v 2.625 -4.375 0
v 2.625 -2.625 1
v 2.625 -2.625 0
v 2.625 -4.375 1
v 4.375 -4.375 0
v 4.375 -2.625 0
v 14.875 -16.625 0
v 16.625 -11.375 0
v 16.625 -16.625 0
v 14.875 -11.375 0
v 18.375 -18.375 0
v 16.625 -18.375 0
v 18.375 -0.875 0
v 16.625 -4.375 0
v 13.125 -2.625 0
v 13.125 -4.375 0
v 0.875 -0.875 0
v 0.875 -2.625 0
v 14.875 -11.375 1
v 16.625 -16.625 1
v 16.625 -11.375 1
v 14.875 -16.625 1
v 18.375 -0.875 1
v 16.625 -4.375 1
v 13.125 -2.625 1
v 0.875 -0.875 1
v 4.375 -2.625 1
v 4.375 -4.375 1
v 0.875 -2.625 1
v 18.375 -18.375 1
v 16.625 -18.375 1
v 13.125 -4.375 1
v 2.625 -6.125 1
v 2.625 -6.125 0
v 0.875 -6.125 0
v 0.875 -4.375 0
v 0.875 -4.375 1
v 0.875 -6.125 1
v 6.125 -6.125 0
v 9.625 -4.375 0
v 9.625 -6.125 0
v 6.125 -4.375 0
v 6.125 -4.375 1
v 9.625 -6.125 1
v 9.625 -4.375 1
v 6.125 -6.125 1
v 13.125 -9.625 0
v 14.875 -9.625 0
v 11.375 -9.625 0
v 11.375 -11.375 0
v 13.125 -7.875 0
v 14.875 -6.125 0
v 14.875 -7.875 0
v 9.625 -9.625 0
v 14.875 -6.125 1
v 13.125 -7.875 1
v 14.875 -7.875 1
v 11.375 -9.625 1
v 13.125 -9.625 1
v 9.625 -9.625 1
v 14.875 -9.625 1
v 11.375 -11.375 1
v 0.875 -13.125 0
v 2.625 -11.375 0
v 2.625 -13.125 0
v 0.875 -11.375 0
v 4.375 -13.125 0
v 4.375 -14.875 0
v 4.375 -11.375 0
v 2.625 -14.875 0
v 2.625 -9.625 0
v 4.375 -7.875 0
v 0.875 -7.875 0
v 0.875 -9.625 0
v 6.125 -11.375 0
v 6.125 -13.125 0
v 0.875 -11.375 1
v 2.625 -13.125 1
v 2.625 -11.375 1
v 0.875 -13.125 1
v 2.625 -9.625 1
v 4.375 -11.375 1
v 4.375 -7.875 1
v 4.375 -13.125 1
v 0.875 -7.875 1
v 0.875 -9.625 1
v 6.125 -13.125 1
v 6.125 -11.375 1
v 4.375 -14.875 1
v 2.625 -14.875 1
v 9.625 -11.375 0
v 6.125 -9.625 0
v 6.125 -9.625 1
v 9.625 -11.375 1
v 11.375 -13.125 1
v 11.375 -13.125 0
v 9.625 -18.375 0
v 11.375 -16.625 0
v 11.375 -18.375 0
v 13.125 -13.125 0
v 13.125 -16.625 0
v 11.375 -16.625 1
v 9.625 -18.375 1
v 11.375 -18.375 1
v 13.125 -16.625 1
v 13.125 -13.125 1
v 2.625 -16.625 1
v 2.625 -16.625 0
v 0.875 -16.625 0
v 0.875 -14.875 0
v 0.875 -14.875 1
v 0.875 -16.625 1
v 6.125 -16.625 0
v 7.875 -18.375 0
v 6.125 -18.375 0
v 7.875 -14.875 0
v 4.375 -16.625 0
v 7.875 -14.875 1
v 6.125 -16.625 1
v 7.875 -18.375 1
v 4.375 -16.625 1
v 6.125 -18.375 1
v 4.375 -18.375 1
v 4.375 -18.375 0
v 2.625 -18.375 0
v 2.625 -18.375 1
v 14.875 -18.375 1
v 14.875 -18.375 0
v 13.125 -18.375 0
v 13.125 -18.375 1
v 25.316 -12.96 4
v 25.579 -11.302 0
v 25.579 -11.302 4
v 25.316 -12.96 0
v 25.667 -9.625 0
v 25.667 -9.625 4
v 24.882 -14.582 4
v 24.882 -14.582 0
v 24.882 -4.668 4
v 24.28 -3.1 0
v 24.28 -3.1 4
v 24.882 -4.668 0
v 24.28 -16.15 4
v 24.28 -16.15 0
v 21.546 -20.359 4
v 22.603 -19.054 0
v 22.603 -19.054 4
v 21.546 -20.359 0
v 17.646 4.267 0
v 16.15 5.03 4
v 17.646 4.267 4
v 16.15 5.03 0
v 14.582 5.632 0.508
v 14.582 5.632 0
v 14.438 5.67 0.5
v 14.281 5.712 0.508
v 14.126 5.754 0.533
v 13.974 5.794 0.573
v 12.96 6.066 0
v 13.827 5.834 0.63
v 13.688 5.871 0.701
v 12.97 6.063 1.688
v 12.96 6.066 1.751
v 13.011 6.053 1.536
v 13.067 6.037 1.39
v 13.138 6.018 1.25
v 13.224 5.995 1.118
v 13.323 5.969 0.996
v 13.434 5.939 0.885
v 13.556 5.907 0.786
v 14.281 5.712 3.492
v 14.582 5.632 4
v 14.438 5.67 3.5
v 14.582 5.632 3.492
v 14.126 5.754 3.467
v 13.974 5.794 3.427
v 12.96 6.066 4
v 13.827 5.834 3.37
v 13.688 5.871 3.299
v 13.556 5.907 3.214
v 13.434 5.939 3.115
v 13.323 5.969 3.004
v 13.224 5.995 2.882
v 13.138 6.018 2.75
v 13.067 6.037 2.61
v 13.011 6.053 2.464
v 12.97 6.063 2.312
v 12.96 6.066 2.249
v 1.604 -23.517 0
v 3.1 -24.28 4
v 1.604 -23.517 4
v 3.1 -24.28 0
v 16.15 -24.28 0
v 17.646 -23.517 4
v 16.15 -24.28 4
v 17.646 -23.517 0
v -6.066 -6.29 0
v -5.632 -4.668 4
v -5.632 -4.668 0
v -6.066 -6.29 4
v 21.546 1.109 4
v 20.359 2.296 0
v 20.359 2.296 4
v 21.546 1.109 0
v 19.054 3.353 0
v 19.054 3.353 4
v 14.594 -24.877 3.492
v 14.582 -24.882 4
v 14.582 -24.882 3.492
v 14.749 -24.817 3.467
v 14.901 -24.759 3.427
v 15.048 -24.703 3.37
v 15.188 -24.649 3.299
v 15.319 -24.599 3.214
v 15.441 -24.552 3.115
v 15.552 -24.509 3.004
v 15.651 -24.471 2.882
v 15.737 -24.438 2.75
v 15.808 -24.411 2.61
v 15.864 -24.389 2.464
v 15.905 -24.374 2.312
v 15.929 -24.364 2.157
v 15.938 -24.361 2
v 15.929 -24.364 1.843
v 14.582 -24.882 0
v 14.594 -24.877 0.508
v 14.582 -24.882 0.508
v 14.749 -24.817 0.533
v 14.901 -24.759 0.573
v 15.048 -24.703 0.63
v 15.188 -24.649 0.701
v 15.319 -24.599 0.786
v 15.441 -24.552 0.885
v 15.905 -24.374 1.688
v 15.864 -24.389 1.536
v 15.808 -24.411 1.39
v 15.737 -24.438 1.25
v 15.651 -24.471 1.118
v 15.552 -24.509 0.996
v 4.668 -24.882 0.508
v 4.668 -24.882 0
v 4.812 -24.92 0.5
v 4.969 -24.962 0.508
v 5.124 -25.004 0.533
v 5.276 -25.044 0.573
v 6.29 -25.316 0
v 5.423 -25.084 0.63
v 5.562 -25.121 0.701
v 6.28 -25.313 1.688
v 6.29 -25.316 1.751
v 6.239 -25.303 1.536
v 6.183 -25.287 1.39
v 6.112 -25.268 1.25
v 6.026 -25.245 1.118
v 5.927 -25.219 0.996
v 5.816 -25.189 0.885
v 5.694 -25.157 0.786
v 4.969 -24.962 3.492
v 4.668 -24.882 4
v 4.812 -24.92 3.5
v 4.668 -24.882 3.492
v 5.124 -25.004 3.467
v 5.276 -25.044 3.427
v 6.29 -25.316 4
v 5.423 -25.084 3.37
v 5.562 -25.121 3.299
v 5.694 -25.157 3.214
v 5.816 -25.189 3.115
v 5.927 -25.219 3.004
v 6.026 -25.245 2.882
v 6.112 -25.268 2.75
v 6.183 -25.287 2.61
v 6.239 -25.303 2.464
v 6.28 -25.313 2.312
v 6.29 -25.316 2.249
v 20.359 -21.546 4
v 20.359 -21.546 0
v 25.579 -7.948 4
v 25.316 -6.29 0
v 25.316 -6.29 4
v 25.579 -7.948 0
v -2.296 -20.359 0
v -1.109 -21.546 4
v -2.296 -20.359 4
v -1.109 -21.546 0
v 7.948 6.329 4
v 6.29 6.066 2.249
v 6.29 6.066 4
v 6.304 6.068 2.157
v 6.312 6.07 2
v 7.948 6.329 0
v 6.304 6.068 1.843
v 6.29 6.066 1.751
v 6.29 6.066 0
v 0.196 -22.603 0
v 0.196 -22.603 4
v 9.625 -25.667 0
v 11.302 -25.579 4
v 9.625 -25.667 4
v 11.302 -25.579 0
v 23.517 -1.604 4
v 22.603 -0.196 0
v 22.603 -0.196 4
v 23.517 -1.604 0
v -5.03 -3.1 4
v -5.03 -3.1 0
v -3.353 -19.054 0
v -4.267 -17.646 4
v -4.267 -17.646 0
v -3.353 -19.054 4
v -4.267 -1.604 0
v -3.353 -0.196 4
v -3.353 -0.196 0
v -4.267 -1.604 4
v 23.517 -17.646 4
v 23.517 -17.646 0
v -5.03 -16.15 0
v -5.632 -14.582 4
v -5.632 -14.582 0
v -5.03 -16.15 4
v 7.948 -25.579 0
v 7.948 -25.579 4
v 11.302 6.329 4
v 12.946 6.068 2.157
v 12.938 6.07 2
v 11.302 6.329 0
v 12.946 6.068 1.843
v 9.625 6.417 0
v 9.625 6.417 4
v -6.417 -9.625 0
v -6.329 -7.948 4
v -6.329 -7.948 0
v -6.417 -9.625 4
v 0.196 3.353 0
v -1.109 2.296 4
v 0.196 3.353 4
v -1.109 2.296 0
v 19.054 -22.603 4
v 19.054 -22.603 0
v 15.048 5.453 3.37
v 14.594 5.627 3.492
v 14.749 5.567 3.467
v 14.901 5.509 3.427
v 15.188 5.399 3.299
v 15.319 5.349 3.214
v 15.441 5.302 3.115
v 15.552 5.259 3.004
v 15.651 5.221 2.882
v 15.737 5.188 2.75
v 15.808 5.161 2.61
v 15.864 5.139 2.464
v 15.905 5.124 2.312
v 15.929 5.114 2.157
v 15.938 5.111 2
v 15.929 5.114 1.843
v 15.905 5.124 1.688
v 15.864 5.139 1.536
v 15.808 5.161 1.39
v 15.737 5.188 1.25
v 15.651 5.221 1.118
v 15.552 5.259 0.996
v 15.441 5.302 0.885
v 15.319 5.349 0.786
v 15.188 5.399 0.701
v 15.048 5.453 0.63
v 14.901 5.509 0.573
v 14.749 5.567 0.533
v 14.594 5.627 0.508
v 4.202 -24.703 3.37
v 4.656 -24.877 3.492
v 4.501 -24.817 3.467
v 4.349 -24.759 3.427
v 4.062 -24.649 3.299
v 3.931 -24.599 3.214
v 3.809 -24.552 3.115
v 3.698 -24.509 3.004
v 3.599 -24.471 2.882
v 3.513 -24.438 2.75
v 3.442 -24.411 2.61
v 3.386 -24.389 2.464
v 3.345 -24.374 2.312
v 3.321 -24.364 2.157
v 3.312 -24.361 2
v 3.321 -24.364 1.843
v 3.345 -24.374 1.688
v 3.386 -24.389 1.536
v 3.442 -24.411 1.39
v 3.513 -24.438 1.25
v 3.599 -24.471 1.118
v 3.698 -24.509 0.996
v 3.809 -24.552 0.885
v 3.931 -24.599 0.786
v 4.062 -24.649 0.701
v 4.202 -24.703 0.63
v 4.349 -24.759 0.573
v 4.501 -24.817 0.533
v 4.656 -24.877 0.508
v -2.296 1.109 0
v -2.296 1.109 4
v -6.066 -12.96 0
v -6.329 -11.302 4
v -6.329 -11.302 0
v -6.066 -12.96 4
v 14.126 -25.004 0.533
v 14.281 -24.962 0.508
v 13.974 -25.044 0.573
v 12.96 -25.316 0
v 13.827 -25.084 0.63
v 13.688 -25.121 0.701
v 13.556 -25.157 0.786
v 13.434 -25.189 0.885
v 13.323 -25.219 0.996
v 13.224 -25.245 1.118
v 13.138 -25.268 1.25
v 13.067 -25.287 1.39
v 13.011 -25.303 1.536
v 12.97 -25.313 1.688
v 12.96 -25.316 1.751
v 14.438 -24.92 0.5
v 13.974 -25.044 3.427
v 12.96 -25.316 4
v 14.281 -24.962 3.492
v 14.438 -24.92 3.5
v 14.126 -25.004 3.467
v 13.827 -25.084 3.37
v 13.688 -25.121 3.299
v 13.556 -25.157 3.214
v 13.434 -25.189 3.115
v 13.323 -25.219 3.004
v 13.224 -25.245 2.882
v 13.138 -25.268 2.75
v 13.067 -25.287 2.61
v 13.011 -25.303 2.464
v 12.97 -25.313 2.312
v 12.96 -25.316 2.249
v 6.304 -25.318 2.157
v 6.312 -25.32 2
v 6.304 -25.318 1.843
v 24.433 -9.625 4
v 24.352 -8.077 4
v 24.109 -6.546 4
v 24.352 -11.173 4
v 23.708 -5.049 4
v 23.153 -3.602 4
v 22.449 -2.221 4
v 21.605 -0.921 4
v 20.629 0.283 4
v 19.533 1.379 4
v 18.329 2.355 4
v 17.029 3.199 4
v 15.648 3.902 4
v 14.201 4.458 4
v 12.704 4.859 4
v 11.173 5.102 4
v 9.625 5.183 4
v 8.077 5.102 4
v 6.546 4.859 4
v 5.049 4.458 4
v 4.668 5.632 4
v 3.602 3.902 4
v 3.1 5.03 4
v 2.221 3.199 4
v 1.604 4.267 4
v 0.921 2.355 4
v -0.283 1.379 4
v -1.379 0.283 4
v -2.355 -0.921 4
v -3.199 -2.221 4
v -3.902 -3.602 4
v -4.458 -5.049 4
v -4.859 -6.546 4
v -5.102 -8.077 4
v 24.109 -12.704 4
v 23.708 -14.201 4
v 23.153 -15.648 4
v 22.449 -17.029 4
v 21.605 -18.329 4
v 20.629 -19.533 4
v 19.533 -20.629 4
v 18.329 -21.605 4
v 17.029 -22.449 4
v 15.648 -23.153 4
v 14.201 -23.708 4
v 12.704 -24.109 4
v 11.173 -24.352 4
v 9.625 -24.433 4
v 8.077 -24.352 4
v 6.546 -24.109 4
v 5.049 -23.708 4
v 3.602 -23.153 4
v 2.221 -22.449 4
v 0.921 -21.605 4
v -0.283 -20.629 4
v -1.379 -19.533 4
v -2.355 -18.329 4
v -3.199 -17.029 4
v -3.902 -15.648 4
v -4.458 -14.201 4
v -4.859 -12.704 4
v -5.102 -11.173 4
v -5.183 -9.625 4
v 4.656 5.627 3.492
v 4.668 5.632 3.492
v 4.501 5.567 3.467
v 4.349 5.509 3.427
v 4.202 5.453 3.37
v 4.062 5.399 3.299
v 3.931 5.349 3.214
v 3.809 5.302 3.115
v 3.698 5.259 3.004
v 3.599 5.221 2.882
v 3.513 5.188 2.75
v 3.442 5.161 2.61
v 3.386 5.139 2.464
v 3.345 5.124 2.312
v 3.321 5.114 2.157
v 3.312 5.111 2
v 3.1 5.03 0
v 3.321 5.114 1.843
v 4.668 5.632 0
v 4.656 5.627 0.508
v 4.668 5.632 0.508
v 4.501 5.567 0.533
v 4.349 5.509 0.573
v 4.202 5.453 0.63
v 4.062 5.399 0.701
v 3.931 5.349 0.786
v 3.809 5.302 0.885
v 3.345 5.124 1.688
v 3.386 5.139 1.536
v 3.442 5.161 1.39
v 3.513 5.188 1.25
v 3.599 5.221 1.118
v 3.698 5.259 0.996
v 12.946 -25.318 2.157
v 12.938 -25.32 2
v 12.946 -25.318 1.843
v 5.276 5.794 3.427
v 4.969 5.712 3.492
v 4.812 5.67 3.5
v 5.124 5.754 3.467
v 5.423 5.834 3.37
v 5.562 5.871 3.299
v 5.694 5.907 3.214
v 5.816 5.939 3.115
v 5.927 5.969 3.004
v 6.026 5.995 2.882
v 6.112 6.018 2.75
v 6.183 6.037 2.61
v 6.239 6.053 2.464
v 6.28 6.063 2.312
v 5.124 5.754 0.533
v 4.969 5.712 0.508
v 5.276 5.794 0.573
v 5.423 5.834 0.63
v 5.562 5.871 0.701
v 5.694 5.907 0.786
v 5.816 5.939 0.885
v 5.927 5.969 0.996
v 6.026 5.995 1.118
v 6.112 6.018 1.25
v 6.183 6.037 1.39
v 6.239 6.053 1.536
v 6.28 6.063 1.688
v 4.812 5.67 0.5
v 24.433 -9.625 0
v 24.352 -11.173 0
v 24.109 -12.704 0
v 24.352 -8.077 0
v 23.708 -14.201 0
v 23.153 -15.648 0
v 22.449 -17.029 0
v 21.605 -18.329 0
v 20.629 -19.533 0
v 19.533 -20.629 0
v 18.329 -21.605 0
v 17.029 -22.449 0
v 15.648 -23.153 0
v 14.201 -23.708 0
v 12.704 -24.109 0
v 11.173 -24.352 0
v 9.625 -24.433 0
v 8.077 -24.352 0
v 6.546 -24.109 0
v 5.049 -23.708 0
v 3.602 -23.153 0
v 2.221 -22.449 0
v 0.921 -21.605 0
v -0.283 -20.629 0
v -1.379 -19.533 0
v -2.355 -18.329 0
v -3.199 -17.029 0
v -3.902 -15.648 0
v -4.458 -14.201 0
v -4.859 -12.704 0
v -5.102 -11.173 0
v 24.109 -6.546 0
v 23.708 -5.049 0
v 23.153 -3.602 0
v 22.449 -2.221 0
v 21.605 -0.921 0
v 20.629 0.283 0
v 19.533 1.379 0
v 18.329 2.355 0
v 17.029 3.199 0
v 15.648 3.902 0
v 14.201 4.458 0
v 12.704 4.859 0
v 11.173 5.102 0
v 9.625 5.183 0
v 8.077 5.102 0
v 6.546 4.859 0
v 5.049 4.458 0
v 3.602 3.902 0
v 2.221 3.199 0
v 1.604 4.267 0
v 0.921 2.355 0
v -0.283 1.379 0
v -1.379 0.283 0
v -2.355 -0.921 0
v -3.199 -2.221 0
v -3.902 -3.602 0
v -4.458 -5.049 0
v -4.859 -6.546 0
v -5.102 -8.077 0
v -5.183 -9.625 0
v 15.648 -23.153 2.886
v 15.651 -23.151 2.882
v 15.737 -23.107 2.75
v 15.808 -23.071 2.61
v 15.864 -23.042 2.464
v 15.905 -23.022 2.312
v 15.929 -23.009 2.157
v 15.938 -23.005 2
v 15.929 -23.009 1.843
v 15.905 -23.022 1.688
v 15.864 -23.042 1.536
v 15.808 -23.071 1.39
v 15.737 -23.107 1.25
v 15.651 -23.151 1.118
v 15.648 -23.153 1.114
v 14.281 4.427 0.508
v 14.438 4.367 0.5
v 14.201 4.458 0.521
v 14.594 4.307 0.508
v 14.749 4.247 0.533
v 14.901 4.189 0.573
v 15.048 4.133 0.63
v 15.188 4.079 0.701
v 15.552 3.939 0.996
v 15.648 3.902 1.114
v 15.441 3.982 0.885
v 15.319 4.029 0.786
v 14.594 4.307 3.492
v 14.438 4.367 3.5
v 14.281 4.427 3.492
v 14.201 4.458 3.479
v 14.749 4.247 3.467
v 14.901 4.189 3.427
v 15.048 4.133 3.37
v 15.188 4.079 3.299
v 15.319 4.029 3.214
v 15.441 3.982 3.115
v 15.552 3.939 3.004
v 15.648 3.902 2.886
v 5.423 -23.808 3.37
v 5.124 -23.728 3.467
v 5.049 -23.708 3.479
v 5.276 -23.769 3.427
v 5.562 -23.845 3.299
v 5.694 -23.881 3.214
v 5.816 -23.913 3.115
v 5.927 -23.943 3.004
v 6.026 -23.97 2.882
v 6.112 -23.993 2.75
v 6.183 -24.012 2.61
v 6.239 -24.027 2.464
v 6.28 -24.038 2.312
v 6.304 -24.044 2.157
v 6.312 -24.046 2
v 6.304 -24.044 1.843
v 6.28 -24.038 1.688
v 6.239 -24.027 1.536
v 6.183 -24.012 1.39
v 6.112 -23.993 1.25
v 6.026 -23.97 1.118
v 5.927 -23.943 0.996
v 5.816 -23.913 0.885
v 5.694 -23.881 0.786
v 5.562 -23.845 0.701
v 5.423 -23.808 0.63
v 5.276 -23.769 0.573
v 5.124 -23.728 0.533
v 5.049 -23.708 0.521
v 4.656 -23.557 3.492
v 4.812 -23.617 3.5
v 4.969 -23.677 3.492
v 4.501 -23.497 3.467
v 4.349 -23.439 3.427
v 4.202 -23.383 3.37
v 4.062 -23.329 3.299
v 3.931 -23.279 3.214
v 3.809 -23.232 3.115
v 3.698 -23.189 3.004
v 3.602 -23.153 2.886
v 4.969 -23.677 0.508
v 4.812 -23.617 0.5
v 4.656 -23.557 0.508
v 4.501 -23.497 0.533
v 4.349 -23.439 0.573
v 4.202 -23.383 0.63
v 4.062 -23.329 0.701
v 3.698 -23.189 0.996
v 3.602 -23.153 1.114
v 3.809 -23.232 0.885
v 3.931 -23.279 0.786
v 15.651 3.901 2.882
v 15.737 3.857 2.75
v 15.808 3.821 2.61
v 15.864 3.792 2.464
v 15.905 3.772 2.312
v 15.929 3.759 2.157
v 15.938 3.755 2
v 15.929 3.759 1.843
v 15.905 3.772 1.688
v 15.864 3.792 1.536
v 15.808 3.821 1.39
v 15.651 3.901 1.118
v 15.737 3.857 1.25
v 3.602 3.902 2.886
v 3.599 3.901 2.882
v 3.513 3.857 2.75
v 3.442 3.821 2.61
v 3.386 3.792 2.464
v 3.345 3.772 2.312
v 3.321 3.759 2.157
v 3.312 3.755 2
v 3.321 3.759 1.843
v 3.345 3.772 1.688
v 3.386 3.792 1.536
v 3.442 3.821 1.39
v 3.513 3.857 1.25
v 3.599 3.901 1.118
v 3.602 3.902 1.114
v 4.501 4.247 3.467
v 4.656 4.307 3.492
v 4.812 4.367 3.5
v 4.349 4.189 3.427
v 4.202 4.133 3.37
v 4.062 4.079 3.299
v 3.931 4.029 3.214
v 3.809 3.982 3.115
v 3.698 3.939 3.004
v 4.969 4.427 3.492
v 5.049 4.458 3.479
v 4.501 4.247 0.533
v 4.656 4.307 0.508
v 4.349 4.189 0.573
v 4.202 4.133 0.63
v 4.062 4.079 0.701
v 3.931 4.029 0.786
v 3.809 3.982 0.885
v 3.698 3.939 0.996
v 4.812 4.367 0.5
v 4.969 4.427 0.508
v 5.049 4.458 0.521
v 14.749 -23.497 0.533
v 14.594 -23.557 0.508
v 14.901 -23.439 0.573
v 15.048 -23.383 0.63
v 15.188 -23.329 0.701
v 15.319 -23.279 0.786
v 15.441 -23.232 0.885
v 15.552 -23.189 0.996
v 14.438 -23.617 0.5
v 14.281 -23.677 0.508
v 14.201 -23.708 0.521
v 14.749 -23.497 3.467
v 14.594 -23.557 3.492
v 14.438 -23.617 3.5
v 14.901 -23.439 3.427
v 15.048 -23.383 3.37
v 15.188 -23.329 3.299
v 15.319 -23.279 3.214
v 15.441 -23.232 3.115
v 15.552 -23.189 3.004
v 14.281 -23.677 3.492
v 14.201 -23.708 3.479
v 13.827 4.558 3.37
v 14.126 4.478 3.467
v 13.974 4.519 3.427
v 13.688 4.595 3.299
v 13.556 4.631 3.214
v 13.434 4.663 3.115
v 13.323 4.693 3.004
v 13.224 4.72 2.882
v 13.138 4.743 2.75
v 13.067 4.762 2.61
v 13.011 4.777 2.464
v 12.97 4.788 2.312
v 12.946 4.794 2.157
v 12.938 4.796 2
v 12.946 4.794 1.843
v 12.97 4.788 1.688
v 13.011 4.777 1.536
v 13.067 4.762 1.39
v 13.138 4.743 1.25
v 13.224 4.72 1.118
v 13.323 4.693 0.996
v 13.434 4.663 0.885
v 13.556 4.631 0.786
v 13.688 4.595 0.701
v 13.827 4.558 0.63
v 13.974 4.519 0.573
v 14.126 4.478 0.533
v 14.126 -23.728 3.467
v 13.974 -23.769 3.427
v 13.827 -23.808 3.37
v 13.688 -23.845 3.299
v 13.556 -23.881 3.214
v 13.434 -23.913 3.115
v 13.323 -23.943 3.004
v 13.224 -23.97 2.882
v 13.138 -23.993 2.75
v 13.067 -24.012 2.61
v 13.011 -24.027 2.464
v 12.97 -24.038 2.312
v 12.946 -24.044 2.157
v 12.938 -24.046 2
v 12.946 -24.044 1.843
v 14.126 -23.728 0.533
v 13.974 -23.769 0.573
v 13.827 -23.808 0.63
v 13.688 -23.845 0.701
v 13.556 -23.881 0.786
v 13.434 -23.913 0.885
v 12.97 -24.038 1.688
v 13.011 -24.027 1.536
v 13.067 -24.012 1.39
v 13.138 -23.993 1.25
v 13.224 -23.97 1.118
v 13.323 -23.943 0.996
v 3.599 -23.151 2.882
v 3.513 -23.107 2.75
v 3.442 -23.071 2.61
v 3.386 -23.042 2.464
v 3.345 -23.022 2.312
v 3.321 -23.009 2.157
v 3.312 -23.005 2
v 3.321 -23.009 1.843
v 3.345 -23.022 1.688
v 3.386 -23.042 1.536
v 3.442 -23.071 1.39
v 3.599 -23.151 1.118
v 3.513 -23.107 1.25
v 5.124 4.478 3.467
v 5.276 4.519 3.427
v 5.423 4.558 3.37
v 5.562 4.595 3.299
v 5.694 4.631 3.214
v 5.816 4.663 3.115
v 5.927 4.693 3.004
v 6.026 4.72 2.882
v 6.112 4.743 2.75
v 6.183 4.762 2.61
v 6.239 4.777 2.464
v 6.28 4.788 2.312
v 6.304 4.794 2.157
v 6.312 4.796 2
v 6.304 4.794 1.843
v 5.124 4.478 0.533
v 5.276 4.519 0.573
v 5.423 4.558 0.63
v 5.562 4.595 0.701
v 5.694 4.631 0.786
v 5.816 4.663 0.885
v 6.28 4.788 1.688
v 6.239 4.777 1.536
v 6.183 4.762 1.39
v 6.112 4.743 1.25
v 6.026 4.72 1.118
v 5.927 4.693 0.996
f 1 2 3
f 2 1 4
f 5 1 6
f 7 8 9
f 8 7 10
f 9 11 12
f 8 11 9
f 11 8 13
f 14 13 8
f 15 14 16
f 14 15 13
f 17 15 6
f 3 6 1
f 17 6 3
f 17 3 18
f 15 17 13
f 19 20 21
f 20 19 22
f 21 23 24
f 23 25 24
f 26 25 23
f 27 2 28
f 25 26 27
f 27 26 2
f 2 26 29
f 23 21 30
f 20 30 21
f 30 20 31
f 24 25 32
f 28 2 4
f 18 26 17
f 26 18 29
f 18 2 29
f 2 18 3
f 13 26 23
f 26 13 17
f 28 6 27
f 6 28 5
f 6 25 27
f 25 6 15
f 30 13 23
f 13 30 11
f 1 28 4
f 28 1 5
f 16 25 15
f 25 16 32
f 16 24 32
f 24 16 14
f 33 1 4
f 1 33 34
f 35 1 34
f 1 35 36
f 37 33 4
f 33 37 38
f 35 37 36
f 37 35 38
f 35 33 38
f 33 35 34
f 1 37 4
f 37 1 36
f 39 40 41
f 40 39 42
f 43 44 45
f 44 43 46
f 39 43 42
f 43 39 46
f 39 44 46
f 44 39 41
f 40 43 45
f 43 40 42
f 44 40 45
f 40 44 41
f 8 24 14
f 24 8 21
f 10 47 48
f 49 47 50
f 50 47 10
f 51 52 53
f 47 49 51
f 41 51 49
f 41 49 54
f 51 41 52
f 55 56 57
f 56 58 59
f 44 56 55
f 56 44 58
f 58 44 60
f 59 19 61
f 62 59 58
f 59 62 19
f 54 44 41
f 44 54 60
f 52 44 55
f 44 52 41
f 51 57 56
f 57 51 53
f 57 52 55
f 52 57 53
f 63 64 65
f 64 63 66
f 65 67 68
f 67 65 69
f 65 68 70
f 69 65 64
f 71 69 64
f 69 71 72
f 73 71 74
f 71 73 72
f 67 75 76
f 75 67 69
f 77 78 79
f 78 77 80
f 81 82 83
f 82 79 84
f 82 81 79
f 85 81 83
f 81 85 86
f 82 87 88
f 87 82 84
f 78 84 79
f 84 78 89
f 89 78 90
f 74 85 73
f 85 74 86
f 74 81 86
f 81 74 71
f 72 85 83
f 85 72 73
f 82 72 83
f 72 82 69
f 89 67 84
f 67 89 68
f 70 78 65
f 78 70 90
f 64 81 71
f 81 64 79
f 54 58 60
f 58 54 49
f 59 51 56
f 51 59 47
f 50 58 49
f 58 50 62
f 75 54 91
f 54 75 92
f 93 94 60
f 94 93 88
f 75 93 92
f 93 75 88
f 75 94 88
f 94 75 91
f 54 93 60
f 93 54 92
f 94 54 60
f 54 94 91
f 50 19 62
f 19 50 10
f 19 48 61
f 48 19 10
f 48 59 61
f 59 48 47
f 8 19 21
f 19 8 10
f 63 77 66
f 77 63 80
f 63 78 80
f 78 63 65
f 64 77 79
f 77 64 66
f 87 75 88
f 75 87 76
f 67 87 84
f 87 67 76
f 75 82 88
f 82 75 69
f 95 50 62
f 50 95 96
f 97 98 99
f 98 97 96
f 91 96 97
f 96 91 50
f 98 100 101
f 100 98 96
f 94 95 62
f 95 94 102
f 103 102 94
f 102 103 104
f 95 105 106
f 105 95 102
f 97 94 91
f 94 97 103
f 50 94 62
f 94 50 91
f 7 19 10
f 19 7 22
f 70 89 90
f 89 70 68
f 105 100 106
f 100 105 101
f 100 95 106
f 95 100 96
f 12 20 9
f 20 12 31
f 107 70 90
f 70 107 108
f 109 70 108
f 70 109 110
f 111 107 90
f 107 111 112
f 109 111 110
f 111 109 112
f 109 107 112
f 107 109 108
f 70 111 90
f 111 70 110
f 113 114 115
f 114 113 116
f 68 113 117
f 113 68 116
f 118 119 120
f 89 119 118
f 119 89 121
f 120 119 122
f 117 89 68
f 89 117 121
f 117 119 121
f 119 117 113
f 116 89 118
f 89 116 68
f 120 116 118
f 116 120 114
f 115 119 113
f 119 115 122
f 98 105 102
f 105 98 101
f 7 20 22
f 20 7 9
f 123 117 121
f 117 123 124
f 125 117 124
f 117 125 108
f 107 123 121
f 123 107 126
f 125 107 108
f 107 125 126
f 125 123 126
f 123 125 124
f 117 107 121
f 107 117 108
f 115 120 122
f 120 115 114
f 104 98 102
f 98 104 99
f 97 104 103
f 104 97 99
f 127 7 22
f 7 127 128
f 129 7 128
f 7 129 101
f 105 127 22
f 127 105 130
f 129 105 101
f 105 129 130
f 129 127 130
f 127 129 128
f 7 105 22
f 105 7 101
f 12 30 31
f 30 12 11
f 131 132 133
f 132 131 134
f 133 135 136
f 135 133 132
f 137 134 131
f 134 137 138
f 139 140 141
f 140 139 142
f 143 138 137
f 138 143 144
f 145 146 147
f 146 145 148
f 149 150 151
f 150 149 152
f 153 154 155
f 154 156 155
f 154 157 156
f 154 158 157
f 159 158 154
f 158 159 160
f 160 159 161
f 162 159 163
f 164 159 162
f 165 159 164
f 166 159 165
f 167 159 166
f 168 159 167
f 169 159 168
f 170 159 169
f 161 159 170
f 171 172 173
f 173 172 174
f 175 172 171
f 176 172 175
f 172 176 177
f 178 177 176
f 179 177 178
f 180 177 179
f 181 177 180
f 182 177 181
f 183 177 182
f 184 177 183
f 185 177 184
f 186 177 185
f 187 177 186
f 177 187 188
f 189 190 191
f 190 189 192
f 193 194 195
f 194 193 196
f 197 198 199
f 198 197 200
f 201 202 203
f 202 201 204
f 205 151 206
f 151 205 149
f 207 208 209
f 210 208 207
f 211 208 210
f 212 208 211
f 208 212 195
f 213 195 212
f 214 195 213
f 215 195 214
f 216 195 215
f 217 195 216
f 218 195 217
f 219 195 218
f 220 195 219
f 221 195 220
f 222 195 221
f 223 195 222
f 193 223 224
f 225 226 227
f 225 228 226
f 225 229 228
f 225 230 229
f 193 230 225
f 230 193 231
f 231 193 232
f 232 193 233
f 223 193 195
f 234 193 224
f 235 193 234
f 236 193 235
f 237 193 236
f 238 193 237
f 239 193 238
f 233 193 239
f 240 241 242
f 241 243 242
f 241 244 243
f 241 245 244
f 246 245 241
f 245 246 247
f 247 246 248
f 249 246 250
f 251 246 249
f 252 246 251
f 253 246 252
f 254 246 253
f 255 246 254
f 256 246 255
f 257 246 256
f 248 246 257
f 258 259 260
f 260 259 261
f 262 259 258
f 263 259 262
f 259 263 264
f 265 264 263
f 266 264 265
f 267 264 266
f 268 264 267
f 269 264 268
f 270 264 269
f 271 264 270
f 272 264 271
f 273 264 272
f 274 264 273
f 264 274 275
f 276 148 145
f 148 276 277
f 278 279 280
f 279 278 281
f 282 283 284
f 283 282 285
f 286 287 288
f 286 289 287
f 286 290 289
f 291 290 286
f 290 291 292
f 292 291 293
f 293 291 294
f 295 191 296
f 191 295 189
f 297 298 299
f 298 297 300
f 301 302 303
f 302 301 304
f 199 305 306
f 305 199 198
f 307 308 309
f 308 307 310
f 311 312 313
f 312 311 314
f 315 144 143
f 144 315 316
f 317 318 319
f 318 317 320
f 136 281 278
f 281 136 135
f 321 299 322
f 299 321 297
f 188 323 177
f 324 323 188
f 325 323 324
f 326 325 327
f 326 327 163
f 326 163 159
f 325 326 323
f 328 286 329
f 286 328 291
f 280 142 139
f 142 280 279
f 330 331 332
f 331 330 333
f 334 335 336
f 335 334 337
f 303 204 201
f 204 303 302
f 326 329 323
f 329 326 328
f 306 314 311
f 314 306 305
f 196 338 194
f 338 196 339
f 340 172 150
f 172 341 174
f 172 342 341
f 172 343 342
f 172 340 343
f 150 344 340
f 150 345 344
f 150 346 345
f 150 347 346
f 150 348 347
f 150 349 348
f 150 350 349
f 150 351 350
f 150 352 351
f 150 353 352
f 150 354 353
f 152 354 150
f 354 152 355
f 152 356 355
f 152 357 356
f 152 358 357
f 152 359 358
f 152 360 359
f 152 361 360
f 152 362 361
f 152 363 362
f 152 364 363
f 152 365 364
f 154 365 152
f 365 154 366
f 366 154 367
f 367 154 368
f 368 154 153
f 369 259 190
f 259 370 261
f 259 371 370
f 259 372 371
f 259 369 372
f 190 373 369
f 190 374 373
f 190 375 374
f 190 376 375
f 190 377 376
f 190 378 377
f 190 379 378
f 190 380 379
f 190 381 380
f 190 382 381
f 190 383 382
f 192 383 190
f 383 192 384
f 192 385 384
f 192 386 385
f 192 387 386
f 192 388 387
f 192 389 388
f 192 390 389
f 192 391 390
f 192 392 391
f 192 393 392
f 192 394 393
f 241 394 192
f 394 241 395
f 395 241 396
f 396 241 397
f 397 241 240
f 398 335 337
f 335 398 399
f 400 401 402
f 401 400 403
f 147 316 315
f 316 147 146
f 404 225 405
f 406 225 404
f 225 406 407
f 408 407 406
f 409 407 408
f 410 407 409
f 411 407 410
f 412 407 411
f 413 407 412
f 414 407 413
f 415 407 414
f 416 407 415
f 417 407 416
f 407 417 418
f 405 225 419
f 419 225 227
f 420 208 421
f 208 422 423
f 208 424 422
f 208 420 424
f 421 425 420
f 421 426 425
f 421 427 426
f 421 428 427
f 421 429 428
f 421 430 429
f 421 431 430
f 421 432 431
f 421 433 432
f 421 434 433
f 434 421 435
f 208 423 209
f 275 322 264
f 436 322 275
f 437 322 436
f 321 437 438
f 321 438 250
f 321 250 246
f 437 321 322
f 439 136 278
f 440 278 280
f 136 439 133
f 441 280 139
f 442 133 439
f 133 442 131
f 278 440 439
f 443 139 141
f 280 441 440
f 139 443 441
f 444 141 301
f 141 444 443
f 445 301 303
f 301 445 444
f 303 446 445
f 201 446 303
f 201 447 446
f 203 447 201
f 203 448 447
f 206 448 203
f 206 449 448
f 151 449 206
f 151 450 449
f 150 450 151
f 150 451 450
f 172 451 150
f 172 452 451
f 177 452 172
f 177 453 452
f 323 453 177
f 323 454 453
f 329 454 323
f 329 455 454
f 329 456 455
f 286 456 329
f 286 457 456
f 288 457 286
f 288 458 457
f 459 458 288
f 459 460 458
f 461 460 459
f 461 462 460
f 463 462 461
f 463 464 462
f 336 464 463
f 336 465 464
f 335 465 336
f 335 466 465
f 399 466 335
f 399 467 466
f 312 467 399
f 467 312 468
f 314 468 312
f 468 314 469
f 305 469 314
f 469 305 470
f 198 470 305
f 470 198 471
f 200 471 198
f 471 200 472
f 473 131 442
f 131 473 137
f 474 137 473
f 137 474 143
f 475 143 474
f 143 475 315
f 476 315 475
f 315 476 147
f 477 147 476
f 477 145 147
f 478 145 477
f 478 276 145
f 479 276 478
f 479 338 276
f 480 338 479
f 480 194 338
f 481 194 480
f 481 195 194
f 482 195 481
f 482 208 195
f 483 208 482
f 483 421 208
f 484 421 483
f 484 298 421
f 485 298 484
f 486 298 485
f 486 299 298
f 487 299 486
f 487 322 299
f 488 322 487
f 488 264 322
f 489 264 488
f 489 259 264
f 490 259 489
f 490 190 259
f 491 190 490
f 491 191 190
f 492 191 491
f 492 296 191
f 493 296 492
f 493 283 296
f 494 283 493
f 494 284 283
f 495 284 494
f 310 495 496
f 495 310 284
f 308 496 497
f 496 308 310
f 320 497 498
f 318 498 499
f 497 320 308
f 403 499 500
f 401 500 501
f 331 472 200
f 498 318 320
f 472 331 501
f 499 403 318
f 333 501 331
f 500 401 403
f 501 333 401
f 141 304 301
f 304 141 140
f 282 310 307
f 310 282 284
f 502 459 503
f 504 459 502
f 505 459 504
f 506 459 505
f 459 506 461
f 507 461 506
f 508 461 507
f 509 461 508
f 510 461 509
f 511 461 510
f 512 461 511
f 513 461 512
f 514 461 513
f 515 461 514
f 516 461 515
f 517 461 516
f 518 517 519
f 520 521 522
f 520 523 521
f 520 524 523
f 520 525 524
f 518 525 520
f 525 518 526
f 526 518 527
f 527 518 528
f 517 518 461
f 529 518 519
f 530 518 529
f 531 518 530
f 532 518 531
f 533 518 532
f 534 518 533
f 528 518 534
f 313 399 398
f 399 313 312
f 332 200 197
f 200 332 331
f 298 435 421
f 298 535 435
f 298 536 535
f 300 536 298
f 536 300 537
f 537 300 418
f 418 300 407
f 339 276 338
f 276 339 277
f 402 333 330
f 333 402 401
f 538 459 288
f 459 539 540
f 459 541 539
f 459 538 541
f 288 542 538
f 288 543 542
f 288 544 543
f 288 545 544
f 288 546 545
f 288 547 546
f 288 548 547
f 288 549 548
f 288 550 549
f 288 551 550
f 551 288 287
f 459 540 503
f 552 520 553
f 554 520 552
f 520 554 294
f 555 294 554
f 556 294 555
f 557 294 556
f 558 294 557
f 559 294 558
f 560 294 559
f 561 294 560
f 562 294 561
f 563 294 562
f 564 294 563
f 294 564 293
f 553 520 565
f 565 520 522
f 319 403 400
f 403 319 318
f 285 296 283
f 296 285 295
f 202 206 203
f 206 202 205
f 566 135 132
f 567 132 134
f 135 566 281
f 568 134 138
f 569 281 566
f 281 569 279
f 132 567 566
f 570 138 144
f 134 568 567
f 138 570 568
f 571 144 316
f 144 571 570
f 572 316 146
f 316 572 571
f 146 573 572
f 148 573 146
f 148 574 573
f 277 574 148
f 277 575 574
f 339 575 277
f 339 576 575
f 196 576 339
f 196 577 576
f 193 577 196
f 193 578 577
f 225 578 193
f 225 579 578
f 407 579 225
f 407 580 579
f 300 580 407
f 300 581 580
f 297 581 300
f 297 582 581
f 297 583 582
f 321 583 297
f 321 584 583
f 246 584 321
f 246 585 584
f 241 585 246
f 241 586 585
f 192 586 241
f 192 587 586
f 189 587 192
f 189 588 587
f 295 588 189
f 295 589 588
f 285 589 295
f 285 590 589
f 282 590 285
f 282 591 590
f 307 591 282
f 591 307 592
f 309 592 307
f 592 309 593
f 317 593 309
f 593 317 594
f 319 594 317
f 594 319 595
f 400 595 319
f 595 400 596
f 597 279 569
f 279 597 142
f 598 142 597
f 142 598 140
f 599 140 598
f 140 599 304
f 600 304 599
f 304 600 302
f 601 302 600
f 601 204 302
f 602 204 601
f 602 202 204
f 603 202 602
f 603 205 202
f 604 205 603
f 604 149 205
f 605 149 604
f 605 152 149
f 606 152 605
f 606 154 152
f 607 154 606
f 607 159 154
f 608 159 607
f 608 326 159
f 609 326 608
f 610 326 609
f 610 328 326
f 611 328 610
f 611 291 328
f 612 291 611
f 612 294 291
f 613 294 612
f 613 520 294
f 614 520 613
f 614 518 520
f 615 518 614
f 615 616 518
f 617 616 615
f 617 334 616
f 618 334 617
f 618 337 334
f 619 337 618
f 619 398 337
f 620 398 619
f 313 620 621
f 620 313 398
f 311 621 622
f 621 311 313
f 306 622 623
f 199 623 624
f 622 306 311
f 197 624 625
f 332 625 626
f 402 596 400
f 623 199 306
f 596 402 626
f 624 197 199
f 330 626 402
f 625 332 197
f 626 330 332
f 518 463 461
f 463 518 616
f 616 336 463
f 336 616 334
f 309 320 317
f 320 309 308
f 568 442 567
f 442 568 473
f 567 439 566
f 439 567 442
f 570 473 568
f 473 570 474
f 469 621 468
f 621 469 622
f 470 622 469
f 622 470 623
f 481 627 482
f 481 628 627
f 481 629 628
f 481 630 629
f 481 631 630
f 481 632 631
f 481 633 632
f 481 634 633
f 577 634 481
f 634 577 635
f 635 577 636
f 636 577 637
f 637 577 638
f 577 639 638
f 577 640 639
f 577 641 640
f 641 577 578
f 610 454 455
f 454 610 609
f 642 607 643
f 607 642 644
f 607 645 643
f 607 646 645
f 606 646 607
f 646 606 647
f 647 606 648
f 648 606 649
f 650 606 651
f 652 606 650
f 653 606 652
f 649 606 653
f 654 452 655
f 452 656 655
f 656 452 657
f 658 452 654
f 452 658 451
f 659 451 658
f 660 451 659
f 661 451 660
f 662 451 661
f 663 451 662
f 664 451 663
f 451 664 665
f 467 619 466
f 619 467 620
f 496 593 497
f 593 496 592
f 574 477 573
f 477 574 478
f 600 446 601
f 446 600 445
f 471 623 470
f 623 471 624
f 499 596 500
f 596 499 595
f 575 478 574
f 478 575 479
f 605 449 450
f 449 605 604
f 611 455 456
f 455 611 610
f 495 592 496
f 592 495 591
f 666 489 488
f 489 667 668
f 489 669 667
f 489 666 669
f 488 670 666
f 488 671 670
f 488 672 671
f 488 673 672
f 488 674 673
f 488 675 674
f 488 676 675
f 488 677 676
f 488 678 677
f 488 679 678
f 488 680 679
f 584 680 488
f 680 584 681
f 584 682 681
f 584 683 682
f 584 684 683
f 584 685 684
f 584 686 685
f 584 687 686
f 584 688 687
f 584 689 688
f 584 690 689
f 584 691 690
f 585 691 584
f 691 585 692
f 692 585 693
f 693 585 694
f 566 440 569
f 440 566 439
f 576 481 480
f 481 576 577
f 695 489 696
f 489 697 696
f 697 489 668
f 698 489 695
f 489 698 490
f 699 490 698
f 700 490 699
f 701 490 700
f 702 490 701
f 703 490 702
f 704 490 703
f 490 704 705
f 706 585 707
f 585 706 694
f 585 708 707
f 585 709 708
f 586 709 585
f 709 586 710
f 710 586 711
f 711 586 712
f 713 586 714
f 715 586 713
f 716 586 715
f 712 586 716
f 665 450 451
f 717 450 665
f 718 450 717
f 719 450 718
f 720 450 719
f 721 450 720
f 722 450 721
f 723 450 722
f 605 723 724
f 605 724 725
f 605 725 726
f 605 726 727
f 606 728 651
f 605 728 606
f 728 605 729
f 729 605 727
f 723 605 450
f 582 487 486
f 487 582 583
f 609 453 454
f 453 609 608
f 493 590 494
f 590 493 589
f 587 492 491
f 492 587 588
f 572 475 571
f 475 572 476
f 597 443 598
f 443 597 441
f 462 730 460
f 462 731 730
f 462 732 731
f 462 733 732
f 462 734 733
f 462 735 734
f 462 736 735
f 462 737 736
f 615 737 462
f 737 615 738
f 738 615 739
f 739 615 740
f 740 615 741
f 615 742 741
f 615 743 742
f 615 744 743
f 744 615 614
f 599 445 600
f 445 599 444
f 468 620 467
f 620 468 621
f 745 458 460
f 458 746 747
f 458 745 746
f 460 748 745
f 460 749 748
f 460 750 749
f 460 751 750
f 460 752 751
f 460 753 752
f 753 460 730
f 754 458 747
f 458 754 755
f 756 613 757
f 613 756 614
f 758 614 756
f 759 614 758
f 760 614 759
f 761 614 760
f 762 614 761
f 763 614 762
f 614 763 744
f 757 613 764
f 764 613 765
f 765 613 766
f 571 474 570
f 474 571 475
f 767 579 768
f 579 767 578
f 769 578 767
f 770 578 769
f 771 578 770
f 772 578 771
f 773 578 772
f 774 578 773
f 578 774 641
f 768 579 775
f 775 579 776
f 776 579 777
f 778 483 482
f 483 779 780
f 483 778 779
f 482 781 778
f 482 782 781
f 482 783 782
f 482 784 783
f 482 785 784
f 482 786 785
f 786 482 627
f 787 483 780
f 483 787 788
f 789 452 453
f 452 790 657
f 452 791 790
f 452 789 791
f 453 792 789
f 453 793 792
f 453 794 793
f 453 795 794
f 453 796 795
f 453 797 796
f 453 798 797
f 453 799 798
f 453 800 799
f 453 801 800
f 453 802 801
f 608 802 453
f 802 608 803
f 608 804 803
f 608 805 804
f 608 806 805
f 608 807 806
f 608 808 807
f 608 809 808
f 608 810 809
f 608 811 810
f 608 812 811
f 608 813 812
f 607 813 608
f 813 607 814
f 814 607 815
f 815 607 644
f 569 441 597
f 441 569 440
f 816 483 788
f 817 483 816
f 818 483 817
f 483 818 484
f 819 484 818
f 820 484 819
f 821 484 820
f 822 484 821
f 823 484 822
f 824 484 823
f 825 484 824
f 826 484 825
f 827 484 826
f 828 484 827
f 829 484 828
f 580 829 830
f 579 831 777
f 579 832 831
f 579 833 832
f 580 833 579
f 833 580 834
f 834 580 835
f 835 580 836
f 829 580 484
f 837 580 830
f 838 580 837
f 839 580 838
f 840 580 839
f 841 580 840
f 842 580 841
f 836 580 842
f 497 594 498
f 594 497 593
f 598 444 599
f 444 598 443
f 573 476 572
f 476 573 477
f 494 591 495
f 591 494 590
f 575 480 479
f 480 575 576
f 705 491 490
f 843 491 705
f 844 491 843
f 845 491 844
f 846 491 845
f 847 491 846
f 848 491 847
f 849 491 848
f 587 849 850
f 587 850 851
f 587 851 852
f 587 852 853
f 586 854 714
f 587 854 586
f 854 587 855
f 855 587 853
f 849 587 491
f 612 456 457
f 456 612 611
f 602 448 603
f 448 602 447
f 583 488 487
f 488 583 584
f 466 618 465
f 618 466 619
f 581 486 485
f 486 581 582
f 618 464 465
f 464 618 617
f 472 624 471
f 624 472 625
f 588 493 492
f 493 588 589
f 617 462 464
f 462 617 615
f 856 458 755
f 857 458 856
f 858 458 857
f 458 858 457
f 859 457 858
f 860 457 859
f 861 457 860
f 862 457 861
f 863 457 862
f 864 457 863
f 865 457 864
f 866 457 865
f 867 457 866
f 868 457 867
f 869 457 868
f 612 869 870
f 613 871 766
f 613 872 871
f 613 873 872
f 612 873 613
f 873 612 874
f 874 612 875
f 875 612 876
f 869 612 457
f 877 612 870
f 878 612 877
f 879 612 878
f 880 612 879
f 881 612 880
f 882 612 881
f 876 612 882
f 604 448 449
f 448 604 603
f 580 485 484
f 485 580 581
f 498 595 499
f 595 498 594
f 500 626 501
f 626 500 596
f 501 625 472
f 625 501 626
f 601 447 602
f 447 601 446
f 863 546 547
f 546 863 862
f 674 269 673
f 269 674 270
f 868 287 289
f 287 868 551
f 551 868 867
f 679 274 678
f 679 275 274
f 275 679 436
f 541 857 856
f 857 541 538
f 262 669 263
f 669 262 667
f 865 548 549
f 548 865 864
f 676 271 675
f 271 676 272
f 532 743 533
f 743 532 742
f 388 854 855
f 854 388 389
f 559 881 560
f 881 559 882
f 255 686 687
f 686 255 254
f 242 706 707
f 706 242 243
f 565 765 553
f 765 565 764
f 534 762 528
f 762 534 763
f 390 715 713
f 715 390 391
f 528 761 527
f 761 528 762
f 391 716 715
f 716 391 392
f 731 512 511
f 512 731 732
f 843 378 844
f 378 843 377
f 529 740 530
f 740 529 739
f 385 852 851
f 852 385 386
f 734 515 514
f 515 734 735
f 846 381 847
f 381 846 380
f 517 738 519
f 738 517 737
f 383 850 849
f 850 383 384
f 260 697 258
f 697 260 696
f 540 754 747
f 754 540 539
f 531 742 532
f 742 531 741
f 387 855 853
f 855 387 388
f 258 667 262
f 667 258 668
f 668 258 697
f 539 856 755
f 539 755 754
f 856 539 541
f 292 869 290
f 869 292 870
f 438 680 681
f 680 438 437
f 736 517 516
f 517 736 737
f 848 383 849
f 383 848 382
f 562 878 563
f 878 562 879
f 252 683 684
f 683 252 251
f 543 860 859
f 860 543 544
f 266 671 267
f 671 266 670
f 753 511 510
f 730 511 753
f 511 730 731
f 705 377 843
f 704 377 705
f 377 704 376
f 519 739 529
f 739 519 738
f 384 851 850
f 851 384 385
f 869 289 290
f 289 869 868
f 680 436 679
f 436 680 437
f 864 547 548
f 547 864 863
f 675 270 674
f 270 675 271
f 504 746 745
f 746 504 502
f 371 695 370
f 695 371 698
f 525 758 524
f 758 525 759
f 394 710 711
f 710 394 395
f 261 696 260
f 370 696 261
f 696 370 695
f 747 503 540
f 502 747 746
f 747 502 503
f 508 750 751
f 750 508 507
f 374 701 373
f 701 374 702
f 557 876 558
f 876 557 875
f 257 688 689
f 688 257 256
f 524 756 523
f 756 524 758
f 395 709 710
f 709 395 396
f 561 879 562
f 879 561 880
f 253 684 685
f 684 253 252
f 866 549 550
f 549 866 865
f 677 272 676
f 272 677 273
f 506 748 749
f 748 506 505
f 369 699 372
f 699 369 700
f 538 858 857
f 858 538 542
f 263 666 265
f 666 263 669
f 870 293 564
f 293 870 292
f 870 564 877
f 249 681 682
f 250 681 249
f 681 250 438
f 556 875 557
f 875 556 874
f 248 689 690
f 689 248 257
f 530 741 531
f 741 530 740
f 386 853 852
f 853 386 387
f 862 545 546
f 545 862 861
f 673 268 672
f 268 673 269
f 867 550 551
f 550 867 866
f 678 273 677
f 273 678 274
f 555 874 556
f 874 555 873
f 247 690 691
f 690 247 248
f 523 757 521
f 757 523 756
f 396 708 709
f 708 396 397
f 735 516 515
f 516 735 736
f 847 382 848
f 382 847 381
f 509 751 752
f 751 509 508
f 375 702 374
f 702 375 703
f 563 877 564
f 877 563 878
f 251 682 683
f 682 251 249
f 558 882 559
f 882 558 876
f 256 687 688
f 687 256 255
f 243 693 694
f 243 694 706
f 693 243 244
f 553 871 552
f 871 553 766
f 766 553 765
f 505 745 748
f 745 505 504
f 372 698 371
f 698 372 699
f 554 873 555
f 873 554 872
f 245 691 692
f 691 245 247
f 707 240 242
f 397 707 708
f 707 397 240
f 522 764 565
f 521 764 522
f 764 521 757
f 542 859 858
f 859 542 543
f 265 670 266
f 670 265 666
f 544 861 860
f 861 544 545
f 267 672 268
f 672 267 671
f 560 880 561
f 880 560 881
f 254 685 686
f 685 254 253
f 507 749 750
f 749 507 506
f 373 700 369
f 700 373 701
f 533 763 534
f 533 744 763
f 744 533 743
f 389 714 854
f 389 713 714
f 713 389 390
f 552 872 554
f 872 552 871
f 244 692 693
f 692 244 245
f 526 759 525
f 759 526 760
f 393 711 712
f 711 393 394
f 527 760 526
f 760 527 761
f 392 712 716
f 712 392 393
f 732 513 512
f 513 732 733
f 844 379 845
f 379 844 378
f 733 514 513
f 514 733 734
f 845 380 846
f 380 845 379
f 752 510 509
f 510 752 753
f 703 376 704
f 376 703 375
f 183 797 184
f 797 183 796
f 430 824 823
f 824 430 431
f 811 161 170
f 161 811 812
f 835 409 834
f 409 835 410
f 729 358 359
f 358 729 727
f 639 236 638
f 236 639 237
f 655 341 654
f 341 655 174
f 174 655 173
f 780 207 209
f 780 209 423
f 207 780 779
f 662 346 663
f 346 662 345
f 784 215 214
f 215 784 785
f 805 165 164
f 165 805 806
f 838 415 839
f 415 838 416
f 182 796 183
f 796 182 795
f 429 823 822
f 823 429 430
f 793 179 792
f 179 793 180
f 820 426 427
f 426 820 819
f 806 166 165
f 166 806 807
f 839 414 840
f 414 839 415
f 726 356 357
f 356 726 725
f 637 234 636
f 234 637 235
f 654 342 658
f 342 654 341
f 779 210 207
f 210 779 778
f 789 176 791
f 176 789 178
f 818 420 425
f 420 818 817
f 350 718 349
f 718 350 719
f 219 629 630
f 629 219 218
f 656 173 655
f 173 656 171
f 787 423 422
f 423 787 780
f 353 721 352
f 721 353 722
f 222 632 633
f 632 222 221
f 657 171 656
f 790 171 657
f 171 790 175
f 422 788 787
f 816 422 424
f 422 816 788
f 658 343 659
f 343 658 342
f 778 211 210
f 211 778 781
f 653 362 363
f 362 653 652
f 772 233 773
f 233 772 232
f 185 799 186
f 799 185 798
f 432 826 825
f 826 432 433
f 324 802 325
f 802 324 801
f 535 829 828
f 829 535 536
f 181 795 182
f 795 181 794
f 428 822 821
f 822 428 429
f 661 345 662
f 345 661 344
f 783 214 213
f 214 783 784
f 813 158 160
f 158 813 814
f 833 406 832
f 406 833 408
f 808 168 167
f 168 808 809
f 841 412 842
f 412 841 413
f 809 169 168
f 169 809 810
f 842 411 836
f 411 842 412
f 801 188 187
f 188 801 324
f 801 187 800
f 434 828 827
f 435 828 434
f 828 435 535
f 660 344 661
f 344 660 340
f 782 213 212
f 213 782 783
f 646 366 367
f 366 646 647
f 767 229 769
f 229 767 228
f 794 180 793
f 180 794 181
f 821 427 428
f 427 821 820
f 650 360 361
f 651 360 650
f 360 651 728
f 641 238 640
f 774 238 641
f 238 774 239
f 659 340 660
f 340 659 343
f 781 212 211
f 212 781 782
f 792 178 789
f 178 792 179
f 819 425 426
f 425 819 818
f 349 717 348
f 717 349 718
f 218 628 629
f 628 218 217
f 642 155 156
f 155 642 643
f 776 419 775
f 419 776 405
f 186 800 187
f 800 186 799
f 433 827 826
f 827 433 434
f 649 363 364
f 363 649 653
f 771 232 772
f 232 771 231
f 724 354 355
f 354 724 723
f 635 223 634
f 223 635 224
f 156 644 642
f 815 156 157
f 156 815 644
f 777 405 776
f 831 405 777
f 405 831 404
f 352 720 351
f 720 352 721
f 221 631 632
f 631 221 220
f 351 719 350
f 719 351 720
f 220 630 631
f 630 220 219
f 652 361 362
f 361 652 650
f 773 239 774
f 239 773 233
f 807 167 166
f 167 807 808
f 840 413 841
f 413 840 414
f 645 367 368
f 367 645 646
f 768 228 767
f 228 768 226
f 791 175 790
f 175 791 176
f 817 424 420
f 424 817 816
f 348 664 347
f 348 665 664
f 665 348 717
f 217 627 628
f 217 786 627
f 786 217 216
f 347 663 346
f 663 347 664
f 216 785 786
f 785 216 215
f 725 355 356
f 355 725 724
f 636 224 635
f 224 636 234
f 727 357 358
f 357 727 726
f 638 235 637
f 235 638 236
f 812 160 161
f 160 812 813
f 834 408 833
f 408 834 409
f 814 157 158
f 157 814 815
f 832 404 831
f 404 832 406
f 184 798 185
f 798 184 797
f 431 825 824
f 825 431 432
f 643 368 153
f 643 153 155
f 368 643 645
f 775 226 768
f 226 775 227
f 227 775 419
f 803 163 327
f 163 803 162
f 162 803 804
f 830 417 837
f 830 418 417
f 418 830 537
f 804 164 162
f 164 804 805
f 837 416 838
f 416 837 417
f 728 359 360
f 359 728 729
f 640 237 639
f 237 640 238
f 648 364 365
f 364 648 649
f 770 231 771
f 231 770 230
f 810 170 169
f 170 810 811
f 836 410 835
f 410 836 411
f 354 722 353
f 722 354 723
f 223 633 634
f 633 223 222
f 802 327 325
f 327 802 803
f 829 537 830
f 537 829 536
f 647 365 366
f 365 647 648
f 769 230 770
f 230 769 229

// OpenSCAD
rotate([180,0,0])translate([0,0,-0.5]){
translate([1.75,1.75,0])  cube(size = [1.75,1.75,1], center=true);
translate([3.5,1.75,0])  cube(size = [1.75,1.75,1], center=true);
translate([5.25,1.75,0])  cube(size = [1.75,1.75,1], center=true);
translate([7,1.75,0])  cube(size = [1.75,1.75,1], center=true);
translate([8.75,1.75,0])  cube(size = [1.75,1.75,1], center=true);
translate([10.5,1.75,0])  cube(size = [1.75,1.75,1], center=true);
translate([12.25,1.75,0])  cube(size = [1.75,1.75,1], center=true);
translate([14,1.75,0])  cube(size = [1.75,1.75,1], center=true);
translate([15.75,1.75,0])  cube(size = [1.75,1.75,1], center=true);
translate([17.5,1.75,0])  cube(size = [1.75,1.75,1], center=true);
translate([17.5,1.75,0])  cube(size = [1.75,1.75,1], center=true);
translate([3.5,3.5,0])  cube(size = [1.75,1.75,1], center=true);
translate([3.5,3.5,0])  cube(size = [1.75,1.75,1], center=true);
translate([3.5,3.5,0])  cube(size = [1.75,1.75,1], center=true);
translate([3.5,3.5,0])  cube(size = [1.75,1.75,1], center=true);
translate([3.5,3.5,0])  cube(size = [1.75,1.75,1], center=true);
translate([3.5,3.5,0])  cube(size = [1.75,1.75,1], center=true);
translate([14,3.5,0])  cube(size = [1.75,1.75,1], center=true);
translate([15.75,3.5,0])  cube(size = [1.75,1.75,1], center=true);
translate([17.5,3.5,0])  cube(size = [1.75,1.75,1], center=true);
translate([1.75,5.25,0])  cube(size = [1.75,1.75,1], center=true);
translate([1.75,5.25,0])  cube(size = [1.75,1.75,1], center=true);
translate([1.75,5.25,0])  cube(size = [1.75,1.75,1], center=true);
translate([7,5.25,0])  cube(size = [1.75,1.75,1], center=true);
translate([8.75,5.25,0])  cube(size = [1.75,1.75,1], center=true);
translate([8.75,5.25,0])  cube(size = [1.75,1.75,1], center=true);
translate([8.75,5.25,0])  cube(size = [1.75,1.75,1], center=true);
translate([8.75,5.25,0])  cube(size = [1.75,1.75,1], center=true);
translate([8.75,5.25,0])  cube(size = [1.75,1.75,1], center=true);
translate([17.5,5.25,0])  cube(size = [1.75,1.75,1], center=true);
translate([17.5,5.25,0])  cube(size = [1.75,1.75,1], center=true);
translate([17.5,5.25,0])  cube(size = [1.75,1.75,1], center=true);
translate([17.5,5.25,0])  cube(size = [1.75,1.75,1], center=true);
translate([17.5,5.25,0])  cube(size = [1.75,1.75,1], center=true);
translate([17.5,5.25,0])  cube(size = [1.75,1.75,1], center=true);
translate([10.5,7,0])  cube(size = [1.75,1.75,1], center=true);
translate([12.25,7,0])  cube(size = [1.75,1.75,1], center=true);
translate([14,7,0])  cube(size = [1.75,1.75,1], center=true);
translate([14,7,0])  cube(size = [1.75,1.75,1], center=true);
translate([17.5,7,0])  cube(size = [1.75,1.75,1], center=true);
translate([1.75,8.75,0])  cube(size = [1.75,1.75,1], center=true);
translate([3.5,8.75,0])  cube(size = [1.75,1.75,1], center=true);
translate([3.5,8.75,0])  cube(size = [1.75,1.75,1], center=true);
translate([3.5,8.75,0])  cube(size = [1.75,1.75,1], center=true);
translate([3.5,8.75,0])  cube(size = [1.75,1.75,1], center=true);
translate([10.5,8.75,0])  cube(size = [1.75,1.75,1], center=true);
translate([12.25,8.75,0])  cube(size = [1.75,1.75,1], center=true);
translate([12.25,8.75,0])  cube(size = [1.75,1.75,1], center=true);
translate([12.25,8.75,0])  cube(size = [1.75,1.75,1], center=true);
translate([17.5,8.75,0])  cube(size = [1.75,1.75,1], center=true);
translate([17.5,8.75,0])  cube(size = [1.75,1.75,1], center=true);
translate([3.5,10.5,0])  cube(size = [1.75,1.75,1], center=true);
translate([3.5,10.5,0])  cube(size = [1.75,1.75,1], center=true);
translate([7,10.5,0])  cube(size = [1.75,1.75,1], center=true);
translate([8.75,10.5,0])  cube(size = [1.75,1.75,1], center=true);
translate([8.75,10.5,0])  cube(size = [1.75,1.75,1], center=true);
translate([12.25,10.5,0])  cube(size = [1.75,1.75,1], center=true);
translate([14,10.5,0])  cube(size = [1.75,1.75,1], center=true);
translate([14,10.5,0])  cube(size = [1.75,1.75,1], center=true);
translate([17.5,10.5,0])  cube(size = [1.75,1.75,1], center=true);
translate([1.75,12.25,0])  cube(size = [1.75,1.75,1], center=true);
translate([3.5,12.25,0])  cube(size = [1.75,1.75,1], center=true);
translate([5.25,12.25,0])  cube(size = [1.75,1.75,1], center=true);
translate([5.25,12.25,0])  cube(size = [1.75,1.75,1], center=true);
translate([5.25,12.25,0])  cube(size = [1.75,1.75,1], center=true);
translate([10.5,12.25,0])  cube(size = [1.75,1.75,1], center=true);
translate([10.5,12.25,0])  cube(size = [1.75,1.75,1], center=true);
translate([10.5,12.25,0])  cube(size = [1.75,1.75,1], center=true);
translate([15.75,12.25,0])  cube(size = [1.75,1.75,1], center=true);
translate([17.5,12.25,0])  cube(size = [1.75,1.75,1], center=true);
translate([17.5,12.25,0])  cube(size = [1.75,1.75,1], center=true);
translate([3.5,14,0])  cube(size = [1.75,1.75,1], center=true);
translate([3.5,14,0])  cube(size = [1.75,1.75,1], center=true);
translate([3.5,14,0])  cube(size = [1.75,1.75,1], center=true);
translate([3.5,14,0])  cube(size = [1.75,1.75,1], center=true);
translate([10.5,14,0])  cube(size = [1.75,1.75,1], center=true);
translate([12.25,14,0])  cube(size = [1.75,1.75,1], center=true);
translate([12.25,14,0])  cube(size = [1.75,1.75,1], center=true);
translate([15.75,14,0])  cube(size = [1.75,1.75,1], center=true);
translate([17.5,14,0])  cube(size = [1.75,1.75,1], center=true);
translate([1.75,15.75,0])  cube(size = [1.75,1.75,1], center=true);
translate([1.75,15.75,0])  cube(size = [1.75,1.75,1], center=true);
translate([5.25,15.75,0])  cube(size = [1.75,1.75,1], center=true);
translate([7,15.75,0])  cube(size = [1.75,1.75,1], center=true);
translate([7,15.75,0])  cube(size = [1.75,1.75,1], center=true);
translate([10.5,15.75,0])  cube(size = [1.75,1.75,1], center=true);
translate([12.25,15.75,0])  cube(size = [1.75,1.75,1], center=true);
translate([12.25,15.75,0])  cube(size = [1.75,1.75,1], center=true);
translate([15.75,15.75,0])  cube(size = [1.75,1.75,1], center=true);
translate([17.5,15.75,0])  cube(size = [1.75,1.75,1], center=true);
translate([17.5,15.75,0])  cube(size = [1.75,1.75,1], center=true);
translate([3.5,17.5,0])  cube(size = [1.75,1.75,1], center=true);
translate([3.5,17.5,0])  cube(size = [1.75,1.75,1], center=true);
translate([7,17.5,0])  cube(size = [1.75,1.75,1], center=true);
translate([7,17.5,0])  cube(size = [1.75,1.75,1], center=true);
translate([10.5,17.5,0])  cube(size = [1.75,1.75,1], center=true);
translate([10.5,17.5,0])  cube(size = [1.75,1.75,1], center=true);
translate([14,17.5,0])  cube(size = [1.75,1.75,1], center=true);
translate([14,17.5,0])  cube(size = [1.75,1.75,1], center=true);
translate([17.5,17.5,0])  cube(size = [1.75,1.75,1], center=true);
}
rotate([180,0,0])difference(){translate([9.625,9.625,-2])  cylinder(r=16.0416666666667,h=4,$fn=60, center=true);
translate([9.625,9.625,-2])  cylinder(r=14.8076923076923,h=4,$fn=60, center=true);
rotate([90,90,0])translate([2,4.8125,0])  cylinder(r=1.5,h=400, $fn=60, center=true);
rotate([90,90,0])translate([2,14.4375,0])  cylinder(r=1.5,h=400, $fn=60, center=true);}
